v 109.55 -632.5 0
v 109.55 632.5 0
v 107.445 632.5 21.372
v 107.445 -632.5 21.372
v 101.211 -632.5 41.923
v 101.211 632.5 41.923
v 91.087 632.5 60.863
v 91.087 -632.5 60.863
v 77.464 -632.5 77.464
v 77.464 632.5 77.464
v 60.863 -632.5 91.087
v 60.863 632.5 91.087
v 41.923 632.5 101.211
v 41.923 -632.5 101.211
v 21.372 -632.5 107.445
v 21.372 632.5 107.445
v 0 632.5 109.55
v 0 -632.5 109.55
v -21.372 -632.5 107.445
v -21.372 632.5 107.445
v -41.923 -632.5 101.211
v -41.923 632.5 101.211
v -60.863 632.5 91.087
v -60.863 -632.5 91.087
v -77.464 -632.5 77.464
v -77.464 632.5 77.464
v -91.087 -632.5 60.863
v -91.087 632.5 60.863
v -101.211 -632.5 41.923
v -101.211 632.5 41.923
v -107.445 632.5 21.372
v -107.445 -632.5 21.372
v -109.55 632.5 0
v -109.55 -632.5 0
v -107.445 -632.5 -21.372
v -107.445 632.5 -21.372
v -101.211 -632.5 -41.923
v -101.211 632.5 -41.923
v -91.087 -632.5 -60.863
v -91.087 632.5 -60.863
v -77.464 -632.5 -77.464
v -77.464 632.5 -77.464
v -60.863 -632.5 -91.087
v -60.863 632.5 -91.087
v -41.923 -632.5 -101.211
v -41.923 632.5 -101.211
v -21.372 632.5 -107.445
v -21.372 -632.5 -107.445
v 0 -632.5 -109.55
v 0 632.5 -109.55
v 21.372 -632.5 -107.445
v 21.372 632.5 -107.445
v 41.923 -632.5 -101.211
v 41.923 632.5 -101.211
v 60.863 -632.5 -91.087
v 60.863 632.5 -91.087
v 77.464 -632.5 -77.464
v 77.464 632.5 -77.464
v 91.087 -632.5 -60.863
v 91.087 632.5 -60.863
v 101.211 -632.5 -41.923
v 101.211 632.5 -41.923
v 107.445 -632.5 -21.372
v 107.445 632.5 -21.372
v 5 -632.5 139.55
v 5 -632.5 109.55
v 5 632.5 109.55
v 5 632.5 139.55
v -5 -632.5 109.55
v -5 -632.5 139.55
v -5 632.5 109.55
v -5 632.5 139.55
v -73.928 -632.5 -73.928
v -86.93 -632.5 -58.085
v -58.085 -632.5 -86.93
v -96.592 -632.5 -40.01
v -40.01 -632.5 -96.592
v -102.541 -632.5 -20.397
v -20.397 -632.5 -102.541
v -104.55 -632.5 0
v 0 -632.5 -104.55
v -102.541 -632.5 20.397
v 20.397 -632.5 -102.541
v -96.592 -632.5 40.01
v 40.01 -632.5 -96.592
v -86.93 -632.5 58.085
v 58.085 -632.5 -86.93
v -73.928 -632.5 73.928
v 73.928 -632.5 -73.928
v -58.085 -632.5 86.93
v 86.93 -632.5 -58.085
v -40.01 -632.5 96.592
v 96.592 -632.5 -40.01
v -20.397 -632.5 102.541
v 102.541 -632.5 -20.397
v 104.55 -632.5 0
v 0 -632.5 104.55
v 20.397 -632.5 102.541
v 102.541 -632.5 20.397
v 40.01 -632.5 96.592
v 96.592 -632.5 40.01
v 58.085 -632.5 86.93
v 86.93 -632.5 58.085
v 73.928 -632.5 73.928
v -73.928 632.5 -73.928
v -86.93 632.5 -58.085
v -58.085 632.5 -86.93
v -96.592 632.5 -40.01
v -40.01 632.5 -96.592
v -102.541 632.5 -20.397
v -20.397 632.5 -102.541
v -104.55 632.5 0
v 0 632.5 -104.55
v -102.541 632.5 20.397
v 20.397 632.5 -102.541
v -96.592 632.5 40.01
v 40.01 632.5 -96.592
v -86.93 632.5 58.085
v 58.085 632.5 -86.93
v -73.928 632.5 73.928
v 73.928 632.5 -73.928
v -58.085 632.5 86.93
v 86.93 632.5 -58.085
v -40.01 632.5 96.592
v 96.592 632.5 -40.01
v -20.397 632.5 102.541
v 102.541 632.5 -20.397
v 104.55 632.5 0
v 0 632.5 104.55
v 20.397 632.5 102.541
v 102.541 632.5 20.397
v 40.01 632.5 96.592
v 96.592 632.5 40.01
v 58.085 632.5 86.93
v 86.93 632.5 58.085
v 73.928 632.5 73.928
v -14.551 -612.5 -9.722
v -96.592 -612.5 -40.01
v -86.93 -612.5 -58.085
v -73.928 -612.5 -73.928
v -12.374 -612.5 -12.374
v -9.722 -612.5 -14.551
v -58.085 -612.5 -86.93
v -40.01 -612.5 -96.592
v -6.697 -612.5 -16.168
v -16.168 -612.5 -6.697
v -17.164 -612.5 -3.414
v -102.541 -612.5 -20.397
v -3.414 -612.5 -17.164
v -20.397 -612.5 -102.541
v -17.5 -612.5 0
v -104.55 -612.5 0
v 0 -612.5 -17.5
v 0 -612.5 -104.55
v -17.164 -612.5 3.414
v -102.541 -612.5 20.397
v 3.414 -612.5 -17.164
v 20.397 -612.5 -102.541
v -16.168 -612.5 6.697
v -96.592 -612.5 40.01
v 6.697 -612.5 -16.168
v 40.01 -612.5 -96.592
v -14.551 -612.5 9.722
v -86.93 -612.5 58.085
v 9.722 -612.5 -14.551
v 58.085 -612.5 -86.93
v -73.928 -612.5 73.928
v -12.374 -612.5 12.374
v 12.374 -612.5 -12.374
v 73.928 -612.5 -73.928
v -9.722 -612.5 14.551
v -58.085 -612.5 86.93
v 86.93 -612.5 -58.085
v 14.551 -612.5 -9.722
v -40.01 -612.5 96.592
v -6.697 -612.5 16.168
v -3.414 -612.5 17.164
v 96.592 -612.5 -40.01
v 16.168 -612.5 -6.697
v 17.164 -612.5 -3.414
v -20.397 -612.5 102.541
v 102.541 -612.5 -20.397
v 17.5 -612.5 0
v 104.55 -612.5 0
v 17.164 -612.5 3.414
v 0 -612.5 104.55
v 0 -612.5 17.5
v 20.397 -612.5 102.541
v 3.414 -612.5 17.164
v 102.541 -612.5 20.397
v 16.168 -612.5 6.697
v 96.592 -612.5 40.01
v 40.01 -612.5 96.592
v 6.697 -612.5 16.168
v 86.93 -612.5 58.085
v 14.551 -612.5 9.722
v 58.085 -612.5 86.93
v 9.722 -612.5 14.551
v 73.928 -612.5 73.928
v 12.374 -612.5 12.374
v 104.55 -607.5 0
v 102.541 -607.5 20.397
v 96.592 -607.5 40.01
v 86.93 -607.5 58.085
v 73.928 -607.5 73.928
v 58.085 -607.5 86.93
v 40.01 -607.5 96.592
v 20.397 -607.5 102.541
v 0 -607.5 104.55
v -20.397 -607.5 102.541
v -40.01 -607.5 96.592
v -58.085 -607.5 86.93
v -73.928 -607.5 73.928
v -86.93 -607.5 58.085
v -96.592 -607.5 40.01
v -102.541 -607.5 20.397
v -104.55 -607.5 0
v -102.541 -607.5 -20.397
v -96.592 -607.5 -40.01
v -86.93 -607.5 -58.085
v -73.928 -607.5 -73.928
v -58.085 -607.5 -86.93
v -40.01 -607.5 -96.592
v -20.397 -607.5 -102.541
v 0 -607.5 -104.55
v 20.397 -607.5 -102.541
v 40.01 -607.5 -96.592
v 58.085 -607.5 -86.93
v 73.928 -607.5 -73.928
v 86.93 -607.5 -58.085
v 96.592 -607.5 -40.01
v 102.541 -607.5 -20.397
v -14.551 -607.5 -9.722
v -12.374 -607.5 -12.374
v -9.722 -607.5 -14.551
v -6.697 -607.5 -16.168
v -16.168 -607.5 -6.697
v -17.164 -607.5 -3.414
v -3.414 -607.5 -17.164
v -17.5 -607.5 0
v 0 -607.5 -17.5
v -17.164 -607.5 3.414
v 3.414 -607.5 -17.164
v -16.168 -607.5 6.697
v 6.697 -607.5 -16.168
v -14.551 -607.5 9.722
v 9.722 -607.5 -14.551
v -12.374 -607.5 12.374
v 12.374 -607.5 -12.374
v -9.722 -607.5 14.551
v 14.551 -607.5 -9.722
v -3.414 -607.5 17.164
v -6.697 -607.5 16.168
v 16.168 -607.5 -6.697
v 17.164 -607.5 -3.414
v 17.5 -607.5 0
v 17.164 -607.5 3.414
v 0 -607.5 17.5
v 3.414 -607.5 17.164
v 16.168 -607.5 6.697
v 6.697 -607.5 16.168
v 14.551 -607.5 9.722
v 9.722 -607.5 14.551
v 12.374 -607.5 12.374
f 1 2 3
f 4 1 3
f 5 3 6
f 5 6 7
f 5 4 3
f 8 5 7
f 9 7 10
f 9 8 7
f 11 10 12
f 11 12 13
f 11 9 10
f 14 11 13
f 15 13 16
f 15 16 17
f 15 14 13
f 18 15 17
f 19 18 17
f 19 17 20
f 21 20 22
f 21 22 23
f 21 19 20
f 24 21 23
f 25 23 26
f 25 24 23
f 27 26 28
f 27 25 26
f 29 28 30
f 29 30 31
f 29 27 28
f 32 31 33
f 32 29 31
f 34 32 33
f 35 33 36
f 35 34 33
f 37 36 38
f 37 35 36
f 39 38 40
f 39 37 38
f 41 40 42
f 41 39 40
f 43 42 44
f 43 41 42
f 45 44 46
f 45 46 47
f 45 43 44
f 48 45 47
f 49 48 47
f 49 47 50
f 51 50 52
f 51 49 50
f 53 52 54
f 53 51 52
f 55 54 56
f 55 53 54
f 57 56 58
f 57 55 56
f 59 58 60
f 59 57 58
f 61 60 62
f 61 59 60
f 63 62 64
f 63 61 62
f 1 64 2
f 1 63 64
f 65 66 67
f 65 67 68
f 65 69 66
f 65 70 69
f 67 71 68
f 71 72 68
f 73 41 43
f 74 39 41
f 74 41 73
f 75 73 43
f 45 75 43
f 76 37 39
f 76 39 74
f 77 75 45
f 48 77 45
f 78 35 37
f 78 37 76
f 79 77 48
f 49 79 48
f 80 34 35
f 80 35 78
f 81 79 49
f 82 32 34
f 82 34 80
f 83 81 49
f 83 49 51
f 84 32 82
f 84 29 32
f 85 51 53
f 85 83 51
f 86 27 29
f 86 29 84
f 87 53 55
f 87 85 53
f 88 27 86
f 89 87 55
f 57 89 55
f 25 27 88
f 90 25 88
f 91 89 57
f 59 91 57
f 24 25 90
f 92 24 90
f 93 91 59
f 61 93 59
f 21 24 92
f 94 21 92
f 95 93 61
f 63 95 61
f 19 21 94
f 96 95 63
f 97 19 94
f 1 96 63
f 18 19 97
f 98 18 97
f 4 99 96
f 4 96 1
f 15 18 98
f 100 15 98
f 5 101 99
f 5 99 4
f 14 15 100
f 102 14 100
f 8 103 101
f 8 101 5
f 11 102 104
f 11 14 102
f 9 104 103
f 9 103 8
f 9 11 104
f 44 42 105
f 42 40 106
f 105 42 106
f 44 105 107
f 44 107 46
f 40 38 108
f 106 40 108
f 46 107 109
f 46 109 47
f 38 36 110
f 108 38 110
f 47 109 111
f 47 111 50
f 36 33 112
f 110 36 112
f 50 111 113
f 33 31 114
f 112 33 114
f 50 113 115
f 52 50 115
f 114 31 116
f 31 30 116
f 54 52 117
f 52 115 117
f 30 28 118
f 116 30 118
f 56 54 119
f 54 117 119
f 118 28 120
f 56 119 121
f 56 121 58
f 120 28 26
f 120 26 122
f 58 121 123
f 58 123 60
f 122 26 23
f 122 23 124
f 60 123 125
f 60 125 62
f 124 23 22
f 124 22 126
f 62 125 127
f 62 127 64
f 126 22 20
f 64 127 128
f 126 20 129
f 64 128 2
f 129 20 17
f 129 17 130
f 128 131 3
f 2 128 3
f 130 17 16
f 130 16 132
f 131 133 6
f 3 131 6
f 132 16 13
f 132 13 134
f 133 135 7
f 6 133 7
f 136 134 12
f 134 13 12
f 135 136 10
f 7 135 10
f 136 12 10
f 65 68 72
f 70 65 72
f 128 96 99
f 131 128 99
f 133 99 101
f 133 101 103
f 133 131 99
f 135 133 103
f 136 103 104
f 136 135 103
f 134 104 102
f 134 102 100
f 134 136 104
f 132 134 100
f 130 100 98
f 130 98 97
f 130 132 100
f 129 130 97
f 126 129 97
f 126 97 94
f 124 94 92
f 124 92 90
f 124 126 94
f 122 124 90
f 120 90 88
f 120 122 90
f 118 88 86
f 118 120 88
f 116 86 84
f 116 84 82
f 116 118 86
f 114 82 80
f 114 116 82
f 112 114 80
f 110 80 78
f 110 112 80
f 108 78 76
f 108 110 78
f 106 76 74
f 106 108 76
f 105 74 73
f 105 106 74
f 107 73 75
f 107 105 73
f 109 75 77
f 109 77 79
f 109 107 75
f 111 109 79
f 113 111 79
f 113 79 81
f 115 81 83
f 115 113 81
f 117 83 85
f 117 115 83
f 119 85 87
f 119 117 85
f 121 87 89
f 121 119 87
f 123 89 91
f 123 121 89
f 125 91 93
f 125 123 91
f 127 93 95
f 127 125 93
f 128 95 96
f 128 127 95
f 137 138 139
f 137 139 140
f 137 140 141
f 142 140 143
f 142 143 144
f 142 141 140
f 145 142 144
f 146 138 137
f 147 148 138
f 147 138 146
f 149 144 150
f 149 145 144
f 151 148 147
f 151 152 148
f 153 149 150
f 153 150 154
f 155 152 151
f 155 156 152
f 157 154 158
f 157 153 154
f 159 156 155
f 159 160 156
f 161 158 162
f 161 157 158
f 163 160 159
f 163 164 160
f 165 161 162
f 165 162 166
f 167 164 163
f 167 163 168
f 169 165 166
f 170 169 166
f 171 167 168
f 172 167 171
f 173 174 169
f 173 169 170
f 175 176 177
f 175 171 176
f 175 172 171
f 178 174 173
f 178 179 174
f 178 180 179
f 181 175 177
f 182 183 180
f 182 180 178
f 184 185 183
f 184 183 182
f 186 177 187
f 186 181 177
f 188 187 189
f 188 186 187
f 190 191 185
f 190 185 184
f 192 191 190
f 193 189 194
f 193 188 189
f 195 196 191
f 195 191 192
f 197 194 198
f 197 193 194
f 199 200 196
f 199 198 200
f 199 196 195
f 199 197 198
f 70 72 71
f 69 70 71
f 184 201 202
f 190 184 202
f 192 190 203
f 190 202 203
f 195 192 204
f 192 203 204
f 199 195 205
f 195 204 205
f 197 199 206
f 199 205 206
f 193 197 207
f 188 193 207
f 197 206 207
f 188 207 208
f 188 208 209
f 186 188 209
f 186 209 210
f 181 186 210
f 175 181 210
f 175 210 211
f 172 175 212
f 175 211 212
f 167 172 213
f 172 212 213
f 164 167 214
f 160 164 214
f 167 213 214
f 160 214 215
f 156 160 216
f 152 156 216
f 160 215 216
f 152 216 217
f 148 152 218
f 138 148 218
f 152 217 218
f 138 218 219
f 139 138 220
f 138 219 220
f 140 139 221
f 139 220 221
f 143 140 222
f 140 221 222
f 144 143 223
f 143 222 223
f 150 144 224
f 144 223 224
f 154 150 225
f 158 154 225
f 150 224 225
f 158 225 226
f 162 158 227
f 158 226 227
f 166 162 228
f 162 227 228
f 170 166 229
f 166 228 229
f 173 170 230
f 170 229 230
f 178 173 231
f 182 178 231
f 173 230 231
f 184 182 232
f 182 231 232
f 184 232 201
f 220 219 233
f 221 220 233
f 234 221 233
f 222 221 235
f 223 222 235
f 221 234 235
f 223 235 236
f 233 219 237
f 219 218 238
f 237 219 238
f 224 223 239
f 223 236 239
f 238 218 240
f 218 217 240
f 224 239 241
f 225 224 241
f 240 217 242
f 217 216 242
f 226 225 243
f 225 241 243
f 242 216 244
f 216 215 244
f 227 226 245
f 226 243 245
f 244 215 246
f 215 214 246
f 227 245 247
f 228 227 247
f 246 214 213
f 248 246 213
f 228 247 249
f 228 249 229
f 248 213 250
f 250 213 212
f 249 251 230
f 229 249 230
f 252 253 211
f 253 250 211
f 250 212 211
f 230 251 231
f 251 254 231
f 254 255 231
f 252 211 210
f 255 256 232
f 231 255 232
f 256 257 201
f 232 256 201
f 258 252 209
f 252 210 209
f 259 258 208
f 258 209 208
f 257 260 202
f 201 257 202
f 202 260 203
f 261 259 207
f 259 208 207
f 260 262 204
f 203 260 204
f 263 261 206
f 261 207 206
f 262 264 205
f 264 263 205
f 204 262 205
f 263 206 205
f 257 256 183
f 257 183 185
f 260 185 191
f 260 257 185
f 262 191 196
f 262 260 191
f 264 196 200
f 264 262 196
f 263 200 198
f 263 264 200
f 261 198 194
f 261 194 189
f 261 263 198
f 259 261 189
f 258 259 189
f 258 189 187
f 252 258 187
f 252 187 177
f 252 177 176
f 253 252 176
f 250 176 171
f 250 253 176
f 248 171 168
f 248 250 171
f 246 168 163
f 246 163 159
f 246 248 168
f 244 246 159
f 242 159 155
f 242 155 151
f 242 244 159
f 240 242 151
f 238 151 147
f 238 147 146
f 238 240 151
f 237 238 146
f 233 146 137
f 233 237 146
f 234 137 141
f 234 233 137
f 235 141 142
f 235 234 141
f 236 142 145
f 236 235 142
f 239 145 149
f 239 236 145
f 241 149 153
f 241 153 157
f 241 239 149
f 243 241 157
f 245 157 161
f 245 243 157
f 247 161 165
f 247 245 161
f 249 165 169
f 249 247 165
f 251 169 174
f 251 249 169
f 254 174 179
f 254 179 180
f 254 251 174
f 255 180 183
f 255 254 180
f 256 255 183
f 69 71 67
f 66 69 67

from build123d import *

# Parameters (mm, degrees)
F1_R          = 104.5499965549
F2_DEPTH      = 632.5
F3_START      = 607.5
F1_R_2        = 17.5
F3_DEPTH      = 5
F4_DEPTH      = 632.5
F4_DEPTH_BACK = 632.5


with BuildPart() as f2:
    # F1 (on Front) → F2 (new body, symmetric)
    with BuildSketch(Plane.XZ):
        with BuildLine():
            ThreePointArc((0, 109.55), (-77.463547879, -77.463547879), (109.55, 0))
            ThreePointArc((109.55, 0), (77.463547879, 77.463547879), (0, 109.55))
        make_face()
        Circle(F1_R, mode=Mode.SUBTRACT)
    extrude(amount=F2_DEPTH, both=True)


with BuildPart() as f3:
    # F1 (on Front) → F3 (new body)
    with BuildSketch(Plane.XZ.offset(F3_START)):
        Circle(F1_R)
        Circle(F1_R_2, mode=Mode.SUBTRACT)
    extrude(amount=F3_DEPTH)


with BuildPart() as f4:
    # F1 (on Front) → F4 (new body, two sides)
    with BuildSketch(Plane.XZ) as f4_sk:
        Polygon((-5, 109.55), (0, 109.55), (5, 109.55), (5, 139.55), (-5, 139.55), align=None)
    extrude(amount=F4_DEPTH)
    extrude(f4_sk.sketch, amount=-F4_DEPTH_BACK)


solid = Compound([f2.part, f3.part, f4.part])
